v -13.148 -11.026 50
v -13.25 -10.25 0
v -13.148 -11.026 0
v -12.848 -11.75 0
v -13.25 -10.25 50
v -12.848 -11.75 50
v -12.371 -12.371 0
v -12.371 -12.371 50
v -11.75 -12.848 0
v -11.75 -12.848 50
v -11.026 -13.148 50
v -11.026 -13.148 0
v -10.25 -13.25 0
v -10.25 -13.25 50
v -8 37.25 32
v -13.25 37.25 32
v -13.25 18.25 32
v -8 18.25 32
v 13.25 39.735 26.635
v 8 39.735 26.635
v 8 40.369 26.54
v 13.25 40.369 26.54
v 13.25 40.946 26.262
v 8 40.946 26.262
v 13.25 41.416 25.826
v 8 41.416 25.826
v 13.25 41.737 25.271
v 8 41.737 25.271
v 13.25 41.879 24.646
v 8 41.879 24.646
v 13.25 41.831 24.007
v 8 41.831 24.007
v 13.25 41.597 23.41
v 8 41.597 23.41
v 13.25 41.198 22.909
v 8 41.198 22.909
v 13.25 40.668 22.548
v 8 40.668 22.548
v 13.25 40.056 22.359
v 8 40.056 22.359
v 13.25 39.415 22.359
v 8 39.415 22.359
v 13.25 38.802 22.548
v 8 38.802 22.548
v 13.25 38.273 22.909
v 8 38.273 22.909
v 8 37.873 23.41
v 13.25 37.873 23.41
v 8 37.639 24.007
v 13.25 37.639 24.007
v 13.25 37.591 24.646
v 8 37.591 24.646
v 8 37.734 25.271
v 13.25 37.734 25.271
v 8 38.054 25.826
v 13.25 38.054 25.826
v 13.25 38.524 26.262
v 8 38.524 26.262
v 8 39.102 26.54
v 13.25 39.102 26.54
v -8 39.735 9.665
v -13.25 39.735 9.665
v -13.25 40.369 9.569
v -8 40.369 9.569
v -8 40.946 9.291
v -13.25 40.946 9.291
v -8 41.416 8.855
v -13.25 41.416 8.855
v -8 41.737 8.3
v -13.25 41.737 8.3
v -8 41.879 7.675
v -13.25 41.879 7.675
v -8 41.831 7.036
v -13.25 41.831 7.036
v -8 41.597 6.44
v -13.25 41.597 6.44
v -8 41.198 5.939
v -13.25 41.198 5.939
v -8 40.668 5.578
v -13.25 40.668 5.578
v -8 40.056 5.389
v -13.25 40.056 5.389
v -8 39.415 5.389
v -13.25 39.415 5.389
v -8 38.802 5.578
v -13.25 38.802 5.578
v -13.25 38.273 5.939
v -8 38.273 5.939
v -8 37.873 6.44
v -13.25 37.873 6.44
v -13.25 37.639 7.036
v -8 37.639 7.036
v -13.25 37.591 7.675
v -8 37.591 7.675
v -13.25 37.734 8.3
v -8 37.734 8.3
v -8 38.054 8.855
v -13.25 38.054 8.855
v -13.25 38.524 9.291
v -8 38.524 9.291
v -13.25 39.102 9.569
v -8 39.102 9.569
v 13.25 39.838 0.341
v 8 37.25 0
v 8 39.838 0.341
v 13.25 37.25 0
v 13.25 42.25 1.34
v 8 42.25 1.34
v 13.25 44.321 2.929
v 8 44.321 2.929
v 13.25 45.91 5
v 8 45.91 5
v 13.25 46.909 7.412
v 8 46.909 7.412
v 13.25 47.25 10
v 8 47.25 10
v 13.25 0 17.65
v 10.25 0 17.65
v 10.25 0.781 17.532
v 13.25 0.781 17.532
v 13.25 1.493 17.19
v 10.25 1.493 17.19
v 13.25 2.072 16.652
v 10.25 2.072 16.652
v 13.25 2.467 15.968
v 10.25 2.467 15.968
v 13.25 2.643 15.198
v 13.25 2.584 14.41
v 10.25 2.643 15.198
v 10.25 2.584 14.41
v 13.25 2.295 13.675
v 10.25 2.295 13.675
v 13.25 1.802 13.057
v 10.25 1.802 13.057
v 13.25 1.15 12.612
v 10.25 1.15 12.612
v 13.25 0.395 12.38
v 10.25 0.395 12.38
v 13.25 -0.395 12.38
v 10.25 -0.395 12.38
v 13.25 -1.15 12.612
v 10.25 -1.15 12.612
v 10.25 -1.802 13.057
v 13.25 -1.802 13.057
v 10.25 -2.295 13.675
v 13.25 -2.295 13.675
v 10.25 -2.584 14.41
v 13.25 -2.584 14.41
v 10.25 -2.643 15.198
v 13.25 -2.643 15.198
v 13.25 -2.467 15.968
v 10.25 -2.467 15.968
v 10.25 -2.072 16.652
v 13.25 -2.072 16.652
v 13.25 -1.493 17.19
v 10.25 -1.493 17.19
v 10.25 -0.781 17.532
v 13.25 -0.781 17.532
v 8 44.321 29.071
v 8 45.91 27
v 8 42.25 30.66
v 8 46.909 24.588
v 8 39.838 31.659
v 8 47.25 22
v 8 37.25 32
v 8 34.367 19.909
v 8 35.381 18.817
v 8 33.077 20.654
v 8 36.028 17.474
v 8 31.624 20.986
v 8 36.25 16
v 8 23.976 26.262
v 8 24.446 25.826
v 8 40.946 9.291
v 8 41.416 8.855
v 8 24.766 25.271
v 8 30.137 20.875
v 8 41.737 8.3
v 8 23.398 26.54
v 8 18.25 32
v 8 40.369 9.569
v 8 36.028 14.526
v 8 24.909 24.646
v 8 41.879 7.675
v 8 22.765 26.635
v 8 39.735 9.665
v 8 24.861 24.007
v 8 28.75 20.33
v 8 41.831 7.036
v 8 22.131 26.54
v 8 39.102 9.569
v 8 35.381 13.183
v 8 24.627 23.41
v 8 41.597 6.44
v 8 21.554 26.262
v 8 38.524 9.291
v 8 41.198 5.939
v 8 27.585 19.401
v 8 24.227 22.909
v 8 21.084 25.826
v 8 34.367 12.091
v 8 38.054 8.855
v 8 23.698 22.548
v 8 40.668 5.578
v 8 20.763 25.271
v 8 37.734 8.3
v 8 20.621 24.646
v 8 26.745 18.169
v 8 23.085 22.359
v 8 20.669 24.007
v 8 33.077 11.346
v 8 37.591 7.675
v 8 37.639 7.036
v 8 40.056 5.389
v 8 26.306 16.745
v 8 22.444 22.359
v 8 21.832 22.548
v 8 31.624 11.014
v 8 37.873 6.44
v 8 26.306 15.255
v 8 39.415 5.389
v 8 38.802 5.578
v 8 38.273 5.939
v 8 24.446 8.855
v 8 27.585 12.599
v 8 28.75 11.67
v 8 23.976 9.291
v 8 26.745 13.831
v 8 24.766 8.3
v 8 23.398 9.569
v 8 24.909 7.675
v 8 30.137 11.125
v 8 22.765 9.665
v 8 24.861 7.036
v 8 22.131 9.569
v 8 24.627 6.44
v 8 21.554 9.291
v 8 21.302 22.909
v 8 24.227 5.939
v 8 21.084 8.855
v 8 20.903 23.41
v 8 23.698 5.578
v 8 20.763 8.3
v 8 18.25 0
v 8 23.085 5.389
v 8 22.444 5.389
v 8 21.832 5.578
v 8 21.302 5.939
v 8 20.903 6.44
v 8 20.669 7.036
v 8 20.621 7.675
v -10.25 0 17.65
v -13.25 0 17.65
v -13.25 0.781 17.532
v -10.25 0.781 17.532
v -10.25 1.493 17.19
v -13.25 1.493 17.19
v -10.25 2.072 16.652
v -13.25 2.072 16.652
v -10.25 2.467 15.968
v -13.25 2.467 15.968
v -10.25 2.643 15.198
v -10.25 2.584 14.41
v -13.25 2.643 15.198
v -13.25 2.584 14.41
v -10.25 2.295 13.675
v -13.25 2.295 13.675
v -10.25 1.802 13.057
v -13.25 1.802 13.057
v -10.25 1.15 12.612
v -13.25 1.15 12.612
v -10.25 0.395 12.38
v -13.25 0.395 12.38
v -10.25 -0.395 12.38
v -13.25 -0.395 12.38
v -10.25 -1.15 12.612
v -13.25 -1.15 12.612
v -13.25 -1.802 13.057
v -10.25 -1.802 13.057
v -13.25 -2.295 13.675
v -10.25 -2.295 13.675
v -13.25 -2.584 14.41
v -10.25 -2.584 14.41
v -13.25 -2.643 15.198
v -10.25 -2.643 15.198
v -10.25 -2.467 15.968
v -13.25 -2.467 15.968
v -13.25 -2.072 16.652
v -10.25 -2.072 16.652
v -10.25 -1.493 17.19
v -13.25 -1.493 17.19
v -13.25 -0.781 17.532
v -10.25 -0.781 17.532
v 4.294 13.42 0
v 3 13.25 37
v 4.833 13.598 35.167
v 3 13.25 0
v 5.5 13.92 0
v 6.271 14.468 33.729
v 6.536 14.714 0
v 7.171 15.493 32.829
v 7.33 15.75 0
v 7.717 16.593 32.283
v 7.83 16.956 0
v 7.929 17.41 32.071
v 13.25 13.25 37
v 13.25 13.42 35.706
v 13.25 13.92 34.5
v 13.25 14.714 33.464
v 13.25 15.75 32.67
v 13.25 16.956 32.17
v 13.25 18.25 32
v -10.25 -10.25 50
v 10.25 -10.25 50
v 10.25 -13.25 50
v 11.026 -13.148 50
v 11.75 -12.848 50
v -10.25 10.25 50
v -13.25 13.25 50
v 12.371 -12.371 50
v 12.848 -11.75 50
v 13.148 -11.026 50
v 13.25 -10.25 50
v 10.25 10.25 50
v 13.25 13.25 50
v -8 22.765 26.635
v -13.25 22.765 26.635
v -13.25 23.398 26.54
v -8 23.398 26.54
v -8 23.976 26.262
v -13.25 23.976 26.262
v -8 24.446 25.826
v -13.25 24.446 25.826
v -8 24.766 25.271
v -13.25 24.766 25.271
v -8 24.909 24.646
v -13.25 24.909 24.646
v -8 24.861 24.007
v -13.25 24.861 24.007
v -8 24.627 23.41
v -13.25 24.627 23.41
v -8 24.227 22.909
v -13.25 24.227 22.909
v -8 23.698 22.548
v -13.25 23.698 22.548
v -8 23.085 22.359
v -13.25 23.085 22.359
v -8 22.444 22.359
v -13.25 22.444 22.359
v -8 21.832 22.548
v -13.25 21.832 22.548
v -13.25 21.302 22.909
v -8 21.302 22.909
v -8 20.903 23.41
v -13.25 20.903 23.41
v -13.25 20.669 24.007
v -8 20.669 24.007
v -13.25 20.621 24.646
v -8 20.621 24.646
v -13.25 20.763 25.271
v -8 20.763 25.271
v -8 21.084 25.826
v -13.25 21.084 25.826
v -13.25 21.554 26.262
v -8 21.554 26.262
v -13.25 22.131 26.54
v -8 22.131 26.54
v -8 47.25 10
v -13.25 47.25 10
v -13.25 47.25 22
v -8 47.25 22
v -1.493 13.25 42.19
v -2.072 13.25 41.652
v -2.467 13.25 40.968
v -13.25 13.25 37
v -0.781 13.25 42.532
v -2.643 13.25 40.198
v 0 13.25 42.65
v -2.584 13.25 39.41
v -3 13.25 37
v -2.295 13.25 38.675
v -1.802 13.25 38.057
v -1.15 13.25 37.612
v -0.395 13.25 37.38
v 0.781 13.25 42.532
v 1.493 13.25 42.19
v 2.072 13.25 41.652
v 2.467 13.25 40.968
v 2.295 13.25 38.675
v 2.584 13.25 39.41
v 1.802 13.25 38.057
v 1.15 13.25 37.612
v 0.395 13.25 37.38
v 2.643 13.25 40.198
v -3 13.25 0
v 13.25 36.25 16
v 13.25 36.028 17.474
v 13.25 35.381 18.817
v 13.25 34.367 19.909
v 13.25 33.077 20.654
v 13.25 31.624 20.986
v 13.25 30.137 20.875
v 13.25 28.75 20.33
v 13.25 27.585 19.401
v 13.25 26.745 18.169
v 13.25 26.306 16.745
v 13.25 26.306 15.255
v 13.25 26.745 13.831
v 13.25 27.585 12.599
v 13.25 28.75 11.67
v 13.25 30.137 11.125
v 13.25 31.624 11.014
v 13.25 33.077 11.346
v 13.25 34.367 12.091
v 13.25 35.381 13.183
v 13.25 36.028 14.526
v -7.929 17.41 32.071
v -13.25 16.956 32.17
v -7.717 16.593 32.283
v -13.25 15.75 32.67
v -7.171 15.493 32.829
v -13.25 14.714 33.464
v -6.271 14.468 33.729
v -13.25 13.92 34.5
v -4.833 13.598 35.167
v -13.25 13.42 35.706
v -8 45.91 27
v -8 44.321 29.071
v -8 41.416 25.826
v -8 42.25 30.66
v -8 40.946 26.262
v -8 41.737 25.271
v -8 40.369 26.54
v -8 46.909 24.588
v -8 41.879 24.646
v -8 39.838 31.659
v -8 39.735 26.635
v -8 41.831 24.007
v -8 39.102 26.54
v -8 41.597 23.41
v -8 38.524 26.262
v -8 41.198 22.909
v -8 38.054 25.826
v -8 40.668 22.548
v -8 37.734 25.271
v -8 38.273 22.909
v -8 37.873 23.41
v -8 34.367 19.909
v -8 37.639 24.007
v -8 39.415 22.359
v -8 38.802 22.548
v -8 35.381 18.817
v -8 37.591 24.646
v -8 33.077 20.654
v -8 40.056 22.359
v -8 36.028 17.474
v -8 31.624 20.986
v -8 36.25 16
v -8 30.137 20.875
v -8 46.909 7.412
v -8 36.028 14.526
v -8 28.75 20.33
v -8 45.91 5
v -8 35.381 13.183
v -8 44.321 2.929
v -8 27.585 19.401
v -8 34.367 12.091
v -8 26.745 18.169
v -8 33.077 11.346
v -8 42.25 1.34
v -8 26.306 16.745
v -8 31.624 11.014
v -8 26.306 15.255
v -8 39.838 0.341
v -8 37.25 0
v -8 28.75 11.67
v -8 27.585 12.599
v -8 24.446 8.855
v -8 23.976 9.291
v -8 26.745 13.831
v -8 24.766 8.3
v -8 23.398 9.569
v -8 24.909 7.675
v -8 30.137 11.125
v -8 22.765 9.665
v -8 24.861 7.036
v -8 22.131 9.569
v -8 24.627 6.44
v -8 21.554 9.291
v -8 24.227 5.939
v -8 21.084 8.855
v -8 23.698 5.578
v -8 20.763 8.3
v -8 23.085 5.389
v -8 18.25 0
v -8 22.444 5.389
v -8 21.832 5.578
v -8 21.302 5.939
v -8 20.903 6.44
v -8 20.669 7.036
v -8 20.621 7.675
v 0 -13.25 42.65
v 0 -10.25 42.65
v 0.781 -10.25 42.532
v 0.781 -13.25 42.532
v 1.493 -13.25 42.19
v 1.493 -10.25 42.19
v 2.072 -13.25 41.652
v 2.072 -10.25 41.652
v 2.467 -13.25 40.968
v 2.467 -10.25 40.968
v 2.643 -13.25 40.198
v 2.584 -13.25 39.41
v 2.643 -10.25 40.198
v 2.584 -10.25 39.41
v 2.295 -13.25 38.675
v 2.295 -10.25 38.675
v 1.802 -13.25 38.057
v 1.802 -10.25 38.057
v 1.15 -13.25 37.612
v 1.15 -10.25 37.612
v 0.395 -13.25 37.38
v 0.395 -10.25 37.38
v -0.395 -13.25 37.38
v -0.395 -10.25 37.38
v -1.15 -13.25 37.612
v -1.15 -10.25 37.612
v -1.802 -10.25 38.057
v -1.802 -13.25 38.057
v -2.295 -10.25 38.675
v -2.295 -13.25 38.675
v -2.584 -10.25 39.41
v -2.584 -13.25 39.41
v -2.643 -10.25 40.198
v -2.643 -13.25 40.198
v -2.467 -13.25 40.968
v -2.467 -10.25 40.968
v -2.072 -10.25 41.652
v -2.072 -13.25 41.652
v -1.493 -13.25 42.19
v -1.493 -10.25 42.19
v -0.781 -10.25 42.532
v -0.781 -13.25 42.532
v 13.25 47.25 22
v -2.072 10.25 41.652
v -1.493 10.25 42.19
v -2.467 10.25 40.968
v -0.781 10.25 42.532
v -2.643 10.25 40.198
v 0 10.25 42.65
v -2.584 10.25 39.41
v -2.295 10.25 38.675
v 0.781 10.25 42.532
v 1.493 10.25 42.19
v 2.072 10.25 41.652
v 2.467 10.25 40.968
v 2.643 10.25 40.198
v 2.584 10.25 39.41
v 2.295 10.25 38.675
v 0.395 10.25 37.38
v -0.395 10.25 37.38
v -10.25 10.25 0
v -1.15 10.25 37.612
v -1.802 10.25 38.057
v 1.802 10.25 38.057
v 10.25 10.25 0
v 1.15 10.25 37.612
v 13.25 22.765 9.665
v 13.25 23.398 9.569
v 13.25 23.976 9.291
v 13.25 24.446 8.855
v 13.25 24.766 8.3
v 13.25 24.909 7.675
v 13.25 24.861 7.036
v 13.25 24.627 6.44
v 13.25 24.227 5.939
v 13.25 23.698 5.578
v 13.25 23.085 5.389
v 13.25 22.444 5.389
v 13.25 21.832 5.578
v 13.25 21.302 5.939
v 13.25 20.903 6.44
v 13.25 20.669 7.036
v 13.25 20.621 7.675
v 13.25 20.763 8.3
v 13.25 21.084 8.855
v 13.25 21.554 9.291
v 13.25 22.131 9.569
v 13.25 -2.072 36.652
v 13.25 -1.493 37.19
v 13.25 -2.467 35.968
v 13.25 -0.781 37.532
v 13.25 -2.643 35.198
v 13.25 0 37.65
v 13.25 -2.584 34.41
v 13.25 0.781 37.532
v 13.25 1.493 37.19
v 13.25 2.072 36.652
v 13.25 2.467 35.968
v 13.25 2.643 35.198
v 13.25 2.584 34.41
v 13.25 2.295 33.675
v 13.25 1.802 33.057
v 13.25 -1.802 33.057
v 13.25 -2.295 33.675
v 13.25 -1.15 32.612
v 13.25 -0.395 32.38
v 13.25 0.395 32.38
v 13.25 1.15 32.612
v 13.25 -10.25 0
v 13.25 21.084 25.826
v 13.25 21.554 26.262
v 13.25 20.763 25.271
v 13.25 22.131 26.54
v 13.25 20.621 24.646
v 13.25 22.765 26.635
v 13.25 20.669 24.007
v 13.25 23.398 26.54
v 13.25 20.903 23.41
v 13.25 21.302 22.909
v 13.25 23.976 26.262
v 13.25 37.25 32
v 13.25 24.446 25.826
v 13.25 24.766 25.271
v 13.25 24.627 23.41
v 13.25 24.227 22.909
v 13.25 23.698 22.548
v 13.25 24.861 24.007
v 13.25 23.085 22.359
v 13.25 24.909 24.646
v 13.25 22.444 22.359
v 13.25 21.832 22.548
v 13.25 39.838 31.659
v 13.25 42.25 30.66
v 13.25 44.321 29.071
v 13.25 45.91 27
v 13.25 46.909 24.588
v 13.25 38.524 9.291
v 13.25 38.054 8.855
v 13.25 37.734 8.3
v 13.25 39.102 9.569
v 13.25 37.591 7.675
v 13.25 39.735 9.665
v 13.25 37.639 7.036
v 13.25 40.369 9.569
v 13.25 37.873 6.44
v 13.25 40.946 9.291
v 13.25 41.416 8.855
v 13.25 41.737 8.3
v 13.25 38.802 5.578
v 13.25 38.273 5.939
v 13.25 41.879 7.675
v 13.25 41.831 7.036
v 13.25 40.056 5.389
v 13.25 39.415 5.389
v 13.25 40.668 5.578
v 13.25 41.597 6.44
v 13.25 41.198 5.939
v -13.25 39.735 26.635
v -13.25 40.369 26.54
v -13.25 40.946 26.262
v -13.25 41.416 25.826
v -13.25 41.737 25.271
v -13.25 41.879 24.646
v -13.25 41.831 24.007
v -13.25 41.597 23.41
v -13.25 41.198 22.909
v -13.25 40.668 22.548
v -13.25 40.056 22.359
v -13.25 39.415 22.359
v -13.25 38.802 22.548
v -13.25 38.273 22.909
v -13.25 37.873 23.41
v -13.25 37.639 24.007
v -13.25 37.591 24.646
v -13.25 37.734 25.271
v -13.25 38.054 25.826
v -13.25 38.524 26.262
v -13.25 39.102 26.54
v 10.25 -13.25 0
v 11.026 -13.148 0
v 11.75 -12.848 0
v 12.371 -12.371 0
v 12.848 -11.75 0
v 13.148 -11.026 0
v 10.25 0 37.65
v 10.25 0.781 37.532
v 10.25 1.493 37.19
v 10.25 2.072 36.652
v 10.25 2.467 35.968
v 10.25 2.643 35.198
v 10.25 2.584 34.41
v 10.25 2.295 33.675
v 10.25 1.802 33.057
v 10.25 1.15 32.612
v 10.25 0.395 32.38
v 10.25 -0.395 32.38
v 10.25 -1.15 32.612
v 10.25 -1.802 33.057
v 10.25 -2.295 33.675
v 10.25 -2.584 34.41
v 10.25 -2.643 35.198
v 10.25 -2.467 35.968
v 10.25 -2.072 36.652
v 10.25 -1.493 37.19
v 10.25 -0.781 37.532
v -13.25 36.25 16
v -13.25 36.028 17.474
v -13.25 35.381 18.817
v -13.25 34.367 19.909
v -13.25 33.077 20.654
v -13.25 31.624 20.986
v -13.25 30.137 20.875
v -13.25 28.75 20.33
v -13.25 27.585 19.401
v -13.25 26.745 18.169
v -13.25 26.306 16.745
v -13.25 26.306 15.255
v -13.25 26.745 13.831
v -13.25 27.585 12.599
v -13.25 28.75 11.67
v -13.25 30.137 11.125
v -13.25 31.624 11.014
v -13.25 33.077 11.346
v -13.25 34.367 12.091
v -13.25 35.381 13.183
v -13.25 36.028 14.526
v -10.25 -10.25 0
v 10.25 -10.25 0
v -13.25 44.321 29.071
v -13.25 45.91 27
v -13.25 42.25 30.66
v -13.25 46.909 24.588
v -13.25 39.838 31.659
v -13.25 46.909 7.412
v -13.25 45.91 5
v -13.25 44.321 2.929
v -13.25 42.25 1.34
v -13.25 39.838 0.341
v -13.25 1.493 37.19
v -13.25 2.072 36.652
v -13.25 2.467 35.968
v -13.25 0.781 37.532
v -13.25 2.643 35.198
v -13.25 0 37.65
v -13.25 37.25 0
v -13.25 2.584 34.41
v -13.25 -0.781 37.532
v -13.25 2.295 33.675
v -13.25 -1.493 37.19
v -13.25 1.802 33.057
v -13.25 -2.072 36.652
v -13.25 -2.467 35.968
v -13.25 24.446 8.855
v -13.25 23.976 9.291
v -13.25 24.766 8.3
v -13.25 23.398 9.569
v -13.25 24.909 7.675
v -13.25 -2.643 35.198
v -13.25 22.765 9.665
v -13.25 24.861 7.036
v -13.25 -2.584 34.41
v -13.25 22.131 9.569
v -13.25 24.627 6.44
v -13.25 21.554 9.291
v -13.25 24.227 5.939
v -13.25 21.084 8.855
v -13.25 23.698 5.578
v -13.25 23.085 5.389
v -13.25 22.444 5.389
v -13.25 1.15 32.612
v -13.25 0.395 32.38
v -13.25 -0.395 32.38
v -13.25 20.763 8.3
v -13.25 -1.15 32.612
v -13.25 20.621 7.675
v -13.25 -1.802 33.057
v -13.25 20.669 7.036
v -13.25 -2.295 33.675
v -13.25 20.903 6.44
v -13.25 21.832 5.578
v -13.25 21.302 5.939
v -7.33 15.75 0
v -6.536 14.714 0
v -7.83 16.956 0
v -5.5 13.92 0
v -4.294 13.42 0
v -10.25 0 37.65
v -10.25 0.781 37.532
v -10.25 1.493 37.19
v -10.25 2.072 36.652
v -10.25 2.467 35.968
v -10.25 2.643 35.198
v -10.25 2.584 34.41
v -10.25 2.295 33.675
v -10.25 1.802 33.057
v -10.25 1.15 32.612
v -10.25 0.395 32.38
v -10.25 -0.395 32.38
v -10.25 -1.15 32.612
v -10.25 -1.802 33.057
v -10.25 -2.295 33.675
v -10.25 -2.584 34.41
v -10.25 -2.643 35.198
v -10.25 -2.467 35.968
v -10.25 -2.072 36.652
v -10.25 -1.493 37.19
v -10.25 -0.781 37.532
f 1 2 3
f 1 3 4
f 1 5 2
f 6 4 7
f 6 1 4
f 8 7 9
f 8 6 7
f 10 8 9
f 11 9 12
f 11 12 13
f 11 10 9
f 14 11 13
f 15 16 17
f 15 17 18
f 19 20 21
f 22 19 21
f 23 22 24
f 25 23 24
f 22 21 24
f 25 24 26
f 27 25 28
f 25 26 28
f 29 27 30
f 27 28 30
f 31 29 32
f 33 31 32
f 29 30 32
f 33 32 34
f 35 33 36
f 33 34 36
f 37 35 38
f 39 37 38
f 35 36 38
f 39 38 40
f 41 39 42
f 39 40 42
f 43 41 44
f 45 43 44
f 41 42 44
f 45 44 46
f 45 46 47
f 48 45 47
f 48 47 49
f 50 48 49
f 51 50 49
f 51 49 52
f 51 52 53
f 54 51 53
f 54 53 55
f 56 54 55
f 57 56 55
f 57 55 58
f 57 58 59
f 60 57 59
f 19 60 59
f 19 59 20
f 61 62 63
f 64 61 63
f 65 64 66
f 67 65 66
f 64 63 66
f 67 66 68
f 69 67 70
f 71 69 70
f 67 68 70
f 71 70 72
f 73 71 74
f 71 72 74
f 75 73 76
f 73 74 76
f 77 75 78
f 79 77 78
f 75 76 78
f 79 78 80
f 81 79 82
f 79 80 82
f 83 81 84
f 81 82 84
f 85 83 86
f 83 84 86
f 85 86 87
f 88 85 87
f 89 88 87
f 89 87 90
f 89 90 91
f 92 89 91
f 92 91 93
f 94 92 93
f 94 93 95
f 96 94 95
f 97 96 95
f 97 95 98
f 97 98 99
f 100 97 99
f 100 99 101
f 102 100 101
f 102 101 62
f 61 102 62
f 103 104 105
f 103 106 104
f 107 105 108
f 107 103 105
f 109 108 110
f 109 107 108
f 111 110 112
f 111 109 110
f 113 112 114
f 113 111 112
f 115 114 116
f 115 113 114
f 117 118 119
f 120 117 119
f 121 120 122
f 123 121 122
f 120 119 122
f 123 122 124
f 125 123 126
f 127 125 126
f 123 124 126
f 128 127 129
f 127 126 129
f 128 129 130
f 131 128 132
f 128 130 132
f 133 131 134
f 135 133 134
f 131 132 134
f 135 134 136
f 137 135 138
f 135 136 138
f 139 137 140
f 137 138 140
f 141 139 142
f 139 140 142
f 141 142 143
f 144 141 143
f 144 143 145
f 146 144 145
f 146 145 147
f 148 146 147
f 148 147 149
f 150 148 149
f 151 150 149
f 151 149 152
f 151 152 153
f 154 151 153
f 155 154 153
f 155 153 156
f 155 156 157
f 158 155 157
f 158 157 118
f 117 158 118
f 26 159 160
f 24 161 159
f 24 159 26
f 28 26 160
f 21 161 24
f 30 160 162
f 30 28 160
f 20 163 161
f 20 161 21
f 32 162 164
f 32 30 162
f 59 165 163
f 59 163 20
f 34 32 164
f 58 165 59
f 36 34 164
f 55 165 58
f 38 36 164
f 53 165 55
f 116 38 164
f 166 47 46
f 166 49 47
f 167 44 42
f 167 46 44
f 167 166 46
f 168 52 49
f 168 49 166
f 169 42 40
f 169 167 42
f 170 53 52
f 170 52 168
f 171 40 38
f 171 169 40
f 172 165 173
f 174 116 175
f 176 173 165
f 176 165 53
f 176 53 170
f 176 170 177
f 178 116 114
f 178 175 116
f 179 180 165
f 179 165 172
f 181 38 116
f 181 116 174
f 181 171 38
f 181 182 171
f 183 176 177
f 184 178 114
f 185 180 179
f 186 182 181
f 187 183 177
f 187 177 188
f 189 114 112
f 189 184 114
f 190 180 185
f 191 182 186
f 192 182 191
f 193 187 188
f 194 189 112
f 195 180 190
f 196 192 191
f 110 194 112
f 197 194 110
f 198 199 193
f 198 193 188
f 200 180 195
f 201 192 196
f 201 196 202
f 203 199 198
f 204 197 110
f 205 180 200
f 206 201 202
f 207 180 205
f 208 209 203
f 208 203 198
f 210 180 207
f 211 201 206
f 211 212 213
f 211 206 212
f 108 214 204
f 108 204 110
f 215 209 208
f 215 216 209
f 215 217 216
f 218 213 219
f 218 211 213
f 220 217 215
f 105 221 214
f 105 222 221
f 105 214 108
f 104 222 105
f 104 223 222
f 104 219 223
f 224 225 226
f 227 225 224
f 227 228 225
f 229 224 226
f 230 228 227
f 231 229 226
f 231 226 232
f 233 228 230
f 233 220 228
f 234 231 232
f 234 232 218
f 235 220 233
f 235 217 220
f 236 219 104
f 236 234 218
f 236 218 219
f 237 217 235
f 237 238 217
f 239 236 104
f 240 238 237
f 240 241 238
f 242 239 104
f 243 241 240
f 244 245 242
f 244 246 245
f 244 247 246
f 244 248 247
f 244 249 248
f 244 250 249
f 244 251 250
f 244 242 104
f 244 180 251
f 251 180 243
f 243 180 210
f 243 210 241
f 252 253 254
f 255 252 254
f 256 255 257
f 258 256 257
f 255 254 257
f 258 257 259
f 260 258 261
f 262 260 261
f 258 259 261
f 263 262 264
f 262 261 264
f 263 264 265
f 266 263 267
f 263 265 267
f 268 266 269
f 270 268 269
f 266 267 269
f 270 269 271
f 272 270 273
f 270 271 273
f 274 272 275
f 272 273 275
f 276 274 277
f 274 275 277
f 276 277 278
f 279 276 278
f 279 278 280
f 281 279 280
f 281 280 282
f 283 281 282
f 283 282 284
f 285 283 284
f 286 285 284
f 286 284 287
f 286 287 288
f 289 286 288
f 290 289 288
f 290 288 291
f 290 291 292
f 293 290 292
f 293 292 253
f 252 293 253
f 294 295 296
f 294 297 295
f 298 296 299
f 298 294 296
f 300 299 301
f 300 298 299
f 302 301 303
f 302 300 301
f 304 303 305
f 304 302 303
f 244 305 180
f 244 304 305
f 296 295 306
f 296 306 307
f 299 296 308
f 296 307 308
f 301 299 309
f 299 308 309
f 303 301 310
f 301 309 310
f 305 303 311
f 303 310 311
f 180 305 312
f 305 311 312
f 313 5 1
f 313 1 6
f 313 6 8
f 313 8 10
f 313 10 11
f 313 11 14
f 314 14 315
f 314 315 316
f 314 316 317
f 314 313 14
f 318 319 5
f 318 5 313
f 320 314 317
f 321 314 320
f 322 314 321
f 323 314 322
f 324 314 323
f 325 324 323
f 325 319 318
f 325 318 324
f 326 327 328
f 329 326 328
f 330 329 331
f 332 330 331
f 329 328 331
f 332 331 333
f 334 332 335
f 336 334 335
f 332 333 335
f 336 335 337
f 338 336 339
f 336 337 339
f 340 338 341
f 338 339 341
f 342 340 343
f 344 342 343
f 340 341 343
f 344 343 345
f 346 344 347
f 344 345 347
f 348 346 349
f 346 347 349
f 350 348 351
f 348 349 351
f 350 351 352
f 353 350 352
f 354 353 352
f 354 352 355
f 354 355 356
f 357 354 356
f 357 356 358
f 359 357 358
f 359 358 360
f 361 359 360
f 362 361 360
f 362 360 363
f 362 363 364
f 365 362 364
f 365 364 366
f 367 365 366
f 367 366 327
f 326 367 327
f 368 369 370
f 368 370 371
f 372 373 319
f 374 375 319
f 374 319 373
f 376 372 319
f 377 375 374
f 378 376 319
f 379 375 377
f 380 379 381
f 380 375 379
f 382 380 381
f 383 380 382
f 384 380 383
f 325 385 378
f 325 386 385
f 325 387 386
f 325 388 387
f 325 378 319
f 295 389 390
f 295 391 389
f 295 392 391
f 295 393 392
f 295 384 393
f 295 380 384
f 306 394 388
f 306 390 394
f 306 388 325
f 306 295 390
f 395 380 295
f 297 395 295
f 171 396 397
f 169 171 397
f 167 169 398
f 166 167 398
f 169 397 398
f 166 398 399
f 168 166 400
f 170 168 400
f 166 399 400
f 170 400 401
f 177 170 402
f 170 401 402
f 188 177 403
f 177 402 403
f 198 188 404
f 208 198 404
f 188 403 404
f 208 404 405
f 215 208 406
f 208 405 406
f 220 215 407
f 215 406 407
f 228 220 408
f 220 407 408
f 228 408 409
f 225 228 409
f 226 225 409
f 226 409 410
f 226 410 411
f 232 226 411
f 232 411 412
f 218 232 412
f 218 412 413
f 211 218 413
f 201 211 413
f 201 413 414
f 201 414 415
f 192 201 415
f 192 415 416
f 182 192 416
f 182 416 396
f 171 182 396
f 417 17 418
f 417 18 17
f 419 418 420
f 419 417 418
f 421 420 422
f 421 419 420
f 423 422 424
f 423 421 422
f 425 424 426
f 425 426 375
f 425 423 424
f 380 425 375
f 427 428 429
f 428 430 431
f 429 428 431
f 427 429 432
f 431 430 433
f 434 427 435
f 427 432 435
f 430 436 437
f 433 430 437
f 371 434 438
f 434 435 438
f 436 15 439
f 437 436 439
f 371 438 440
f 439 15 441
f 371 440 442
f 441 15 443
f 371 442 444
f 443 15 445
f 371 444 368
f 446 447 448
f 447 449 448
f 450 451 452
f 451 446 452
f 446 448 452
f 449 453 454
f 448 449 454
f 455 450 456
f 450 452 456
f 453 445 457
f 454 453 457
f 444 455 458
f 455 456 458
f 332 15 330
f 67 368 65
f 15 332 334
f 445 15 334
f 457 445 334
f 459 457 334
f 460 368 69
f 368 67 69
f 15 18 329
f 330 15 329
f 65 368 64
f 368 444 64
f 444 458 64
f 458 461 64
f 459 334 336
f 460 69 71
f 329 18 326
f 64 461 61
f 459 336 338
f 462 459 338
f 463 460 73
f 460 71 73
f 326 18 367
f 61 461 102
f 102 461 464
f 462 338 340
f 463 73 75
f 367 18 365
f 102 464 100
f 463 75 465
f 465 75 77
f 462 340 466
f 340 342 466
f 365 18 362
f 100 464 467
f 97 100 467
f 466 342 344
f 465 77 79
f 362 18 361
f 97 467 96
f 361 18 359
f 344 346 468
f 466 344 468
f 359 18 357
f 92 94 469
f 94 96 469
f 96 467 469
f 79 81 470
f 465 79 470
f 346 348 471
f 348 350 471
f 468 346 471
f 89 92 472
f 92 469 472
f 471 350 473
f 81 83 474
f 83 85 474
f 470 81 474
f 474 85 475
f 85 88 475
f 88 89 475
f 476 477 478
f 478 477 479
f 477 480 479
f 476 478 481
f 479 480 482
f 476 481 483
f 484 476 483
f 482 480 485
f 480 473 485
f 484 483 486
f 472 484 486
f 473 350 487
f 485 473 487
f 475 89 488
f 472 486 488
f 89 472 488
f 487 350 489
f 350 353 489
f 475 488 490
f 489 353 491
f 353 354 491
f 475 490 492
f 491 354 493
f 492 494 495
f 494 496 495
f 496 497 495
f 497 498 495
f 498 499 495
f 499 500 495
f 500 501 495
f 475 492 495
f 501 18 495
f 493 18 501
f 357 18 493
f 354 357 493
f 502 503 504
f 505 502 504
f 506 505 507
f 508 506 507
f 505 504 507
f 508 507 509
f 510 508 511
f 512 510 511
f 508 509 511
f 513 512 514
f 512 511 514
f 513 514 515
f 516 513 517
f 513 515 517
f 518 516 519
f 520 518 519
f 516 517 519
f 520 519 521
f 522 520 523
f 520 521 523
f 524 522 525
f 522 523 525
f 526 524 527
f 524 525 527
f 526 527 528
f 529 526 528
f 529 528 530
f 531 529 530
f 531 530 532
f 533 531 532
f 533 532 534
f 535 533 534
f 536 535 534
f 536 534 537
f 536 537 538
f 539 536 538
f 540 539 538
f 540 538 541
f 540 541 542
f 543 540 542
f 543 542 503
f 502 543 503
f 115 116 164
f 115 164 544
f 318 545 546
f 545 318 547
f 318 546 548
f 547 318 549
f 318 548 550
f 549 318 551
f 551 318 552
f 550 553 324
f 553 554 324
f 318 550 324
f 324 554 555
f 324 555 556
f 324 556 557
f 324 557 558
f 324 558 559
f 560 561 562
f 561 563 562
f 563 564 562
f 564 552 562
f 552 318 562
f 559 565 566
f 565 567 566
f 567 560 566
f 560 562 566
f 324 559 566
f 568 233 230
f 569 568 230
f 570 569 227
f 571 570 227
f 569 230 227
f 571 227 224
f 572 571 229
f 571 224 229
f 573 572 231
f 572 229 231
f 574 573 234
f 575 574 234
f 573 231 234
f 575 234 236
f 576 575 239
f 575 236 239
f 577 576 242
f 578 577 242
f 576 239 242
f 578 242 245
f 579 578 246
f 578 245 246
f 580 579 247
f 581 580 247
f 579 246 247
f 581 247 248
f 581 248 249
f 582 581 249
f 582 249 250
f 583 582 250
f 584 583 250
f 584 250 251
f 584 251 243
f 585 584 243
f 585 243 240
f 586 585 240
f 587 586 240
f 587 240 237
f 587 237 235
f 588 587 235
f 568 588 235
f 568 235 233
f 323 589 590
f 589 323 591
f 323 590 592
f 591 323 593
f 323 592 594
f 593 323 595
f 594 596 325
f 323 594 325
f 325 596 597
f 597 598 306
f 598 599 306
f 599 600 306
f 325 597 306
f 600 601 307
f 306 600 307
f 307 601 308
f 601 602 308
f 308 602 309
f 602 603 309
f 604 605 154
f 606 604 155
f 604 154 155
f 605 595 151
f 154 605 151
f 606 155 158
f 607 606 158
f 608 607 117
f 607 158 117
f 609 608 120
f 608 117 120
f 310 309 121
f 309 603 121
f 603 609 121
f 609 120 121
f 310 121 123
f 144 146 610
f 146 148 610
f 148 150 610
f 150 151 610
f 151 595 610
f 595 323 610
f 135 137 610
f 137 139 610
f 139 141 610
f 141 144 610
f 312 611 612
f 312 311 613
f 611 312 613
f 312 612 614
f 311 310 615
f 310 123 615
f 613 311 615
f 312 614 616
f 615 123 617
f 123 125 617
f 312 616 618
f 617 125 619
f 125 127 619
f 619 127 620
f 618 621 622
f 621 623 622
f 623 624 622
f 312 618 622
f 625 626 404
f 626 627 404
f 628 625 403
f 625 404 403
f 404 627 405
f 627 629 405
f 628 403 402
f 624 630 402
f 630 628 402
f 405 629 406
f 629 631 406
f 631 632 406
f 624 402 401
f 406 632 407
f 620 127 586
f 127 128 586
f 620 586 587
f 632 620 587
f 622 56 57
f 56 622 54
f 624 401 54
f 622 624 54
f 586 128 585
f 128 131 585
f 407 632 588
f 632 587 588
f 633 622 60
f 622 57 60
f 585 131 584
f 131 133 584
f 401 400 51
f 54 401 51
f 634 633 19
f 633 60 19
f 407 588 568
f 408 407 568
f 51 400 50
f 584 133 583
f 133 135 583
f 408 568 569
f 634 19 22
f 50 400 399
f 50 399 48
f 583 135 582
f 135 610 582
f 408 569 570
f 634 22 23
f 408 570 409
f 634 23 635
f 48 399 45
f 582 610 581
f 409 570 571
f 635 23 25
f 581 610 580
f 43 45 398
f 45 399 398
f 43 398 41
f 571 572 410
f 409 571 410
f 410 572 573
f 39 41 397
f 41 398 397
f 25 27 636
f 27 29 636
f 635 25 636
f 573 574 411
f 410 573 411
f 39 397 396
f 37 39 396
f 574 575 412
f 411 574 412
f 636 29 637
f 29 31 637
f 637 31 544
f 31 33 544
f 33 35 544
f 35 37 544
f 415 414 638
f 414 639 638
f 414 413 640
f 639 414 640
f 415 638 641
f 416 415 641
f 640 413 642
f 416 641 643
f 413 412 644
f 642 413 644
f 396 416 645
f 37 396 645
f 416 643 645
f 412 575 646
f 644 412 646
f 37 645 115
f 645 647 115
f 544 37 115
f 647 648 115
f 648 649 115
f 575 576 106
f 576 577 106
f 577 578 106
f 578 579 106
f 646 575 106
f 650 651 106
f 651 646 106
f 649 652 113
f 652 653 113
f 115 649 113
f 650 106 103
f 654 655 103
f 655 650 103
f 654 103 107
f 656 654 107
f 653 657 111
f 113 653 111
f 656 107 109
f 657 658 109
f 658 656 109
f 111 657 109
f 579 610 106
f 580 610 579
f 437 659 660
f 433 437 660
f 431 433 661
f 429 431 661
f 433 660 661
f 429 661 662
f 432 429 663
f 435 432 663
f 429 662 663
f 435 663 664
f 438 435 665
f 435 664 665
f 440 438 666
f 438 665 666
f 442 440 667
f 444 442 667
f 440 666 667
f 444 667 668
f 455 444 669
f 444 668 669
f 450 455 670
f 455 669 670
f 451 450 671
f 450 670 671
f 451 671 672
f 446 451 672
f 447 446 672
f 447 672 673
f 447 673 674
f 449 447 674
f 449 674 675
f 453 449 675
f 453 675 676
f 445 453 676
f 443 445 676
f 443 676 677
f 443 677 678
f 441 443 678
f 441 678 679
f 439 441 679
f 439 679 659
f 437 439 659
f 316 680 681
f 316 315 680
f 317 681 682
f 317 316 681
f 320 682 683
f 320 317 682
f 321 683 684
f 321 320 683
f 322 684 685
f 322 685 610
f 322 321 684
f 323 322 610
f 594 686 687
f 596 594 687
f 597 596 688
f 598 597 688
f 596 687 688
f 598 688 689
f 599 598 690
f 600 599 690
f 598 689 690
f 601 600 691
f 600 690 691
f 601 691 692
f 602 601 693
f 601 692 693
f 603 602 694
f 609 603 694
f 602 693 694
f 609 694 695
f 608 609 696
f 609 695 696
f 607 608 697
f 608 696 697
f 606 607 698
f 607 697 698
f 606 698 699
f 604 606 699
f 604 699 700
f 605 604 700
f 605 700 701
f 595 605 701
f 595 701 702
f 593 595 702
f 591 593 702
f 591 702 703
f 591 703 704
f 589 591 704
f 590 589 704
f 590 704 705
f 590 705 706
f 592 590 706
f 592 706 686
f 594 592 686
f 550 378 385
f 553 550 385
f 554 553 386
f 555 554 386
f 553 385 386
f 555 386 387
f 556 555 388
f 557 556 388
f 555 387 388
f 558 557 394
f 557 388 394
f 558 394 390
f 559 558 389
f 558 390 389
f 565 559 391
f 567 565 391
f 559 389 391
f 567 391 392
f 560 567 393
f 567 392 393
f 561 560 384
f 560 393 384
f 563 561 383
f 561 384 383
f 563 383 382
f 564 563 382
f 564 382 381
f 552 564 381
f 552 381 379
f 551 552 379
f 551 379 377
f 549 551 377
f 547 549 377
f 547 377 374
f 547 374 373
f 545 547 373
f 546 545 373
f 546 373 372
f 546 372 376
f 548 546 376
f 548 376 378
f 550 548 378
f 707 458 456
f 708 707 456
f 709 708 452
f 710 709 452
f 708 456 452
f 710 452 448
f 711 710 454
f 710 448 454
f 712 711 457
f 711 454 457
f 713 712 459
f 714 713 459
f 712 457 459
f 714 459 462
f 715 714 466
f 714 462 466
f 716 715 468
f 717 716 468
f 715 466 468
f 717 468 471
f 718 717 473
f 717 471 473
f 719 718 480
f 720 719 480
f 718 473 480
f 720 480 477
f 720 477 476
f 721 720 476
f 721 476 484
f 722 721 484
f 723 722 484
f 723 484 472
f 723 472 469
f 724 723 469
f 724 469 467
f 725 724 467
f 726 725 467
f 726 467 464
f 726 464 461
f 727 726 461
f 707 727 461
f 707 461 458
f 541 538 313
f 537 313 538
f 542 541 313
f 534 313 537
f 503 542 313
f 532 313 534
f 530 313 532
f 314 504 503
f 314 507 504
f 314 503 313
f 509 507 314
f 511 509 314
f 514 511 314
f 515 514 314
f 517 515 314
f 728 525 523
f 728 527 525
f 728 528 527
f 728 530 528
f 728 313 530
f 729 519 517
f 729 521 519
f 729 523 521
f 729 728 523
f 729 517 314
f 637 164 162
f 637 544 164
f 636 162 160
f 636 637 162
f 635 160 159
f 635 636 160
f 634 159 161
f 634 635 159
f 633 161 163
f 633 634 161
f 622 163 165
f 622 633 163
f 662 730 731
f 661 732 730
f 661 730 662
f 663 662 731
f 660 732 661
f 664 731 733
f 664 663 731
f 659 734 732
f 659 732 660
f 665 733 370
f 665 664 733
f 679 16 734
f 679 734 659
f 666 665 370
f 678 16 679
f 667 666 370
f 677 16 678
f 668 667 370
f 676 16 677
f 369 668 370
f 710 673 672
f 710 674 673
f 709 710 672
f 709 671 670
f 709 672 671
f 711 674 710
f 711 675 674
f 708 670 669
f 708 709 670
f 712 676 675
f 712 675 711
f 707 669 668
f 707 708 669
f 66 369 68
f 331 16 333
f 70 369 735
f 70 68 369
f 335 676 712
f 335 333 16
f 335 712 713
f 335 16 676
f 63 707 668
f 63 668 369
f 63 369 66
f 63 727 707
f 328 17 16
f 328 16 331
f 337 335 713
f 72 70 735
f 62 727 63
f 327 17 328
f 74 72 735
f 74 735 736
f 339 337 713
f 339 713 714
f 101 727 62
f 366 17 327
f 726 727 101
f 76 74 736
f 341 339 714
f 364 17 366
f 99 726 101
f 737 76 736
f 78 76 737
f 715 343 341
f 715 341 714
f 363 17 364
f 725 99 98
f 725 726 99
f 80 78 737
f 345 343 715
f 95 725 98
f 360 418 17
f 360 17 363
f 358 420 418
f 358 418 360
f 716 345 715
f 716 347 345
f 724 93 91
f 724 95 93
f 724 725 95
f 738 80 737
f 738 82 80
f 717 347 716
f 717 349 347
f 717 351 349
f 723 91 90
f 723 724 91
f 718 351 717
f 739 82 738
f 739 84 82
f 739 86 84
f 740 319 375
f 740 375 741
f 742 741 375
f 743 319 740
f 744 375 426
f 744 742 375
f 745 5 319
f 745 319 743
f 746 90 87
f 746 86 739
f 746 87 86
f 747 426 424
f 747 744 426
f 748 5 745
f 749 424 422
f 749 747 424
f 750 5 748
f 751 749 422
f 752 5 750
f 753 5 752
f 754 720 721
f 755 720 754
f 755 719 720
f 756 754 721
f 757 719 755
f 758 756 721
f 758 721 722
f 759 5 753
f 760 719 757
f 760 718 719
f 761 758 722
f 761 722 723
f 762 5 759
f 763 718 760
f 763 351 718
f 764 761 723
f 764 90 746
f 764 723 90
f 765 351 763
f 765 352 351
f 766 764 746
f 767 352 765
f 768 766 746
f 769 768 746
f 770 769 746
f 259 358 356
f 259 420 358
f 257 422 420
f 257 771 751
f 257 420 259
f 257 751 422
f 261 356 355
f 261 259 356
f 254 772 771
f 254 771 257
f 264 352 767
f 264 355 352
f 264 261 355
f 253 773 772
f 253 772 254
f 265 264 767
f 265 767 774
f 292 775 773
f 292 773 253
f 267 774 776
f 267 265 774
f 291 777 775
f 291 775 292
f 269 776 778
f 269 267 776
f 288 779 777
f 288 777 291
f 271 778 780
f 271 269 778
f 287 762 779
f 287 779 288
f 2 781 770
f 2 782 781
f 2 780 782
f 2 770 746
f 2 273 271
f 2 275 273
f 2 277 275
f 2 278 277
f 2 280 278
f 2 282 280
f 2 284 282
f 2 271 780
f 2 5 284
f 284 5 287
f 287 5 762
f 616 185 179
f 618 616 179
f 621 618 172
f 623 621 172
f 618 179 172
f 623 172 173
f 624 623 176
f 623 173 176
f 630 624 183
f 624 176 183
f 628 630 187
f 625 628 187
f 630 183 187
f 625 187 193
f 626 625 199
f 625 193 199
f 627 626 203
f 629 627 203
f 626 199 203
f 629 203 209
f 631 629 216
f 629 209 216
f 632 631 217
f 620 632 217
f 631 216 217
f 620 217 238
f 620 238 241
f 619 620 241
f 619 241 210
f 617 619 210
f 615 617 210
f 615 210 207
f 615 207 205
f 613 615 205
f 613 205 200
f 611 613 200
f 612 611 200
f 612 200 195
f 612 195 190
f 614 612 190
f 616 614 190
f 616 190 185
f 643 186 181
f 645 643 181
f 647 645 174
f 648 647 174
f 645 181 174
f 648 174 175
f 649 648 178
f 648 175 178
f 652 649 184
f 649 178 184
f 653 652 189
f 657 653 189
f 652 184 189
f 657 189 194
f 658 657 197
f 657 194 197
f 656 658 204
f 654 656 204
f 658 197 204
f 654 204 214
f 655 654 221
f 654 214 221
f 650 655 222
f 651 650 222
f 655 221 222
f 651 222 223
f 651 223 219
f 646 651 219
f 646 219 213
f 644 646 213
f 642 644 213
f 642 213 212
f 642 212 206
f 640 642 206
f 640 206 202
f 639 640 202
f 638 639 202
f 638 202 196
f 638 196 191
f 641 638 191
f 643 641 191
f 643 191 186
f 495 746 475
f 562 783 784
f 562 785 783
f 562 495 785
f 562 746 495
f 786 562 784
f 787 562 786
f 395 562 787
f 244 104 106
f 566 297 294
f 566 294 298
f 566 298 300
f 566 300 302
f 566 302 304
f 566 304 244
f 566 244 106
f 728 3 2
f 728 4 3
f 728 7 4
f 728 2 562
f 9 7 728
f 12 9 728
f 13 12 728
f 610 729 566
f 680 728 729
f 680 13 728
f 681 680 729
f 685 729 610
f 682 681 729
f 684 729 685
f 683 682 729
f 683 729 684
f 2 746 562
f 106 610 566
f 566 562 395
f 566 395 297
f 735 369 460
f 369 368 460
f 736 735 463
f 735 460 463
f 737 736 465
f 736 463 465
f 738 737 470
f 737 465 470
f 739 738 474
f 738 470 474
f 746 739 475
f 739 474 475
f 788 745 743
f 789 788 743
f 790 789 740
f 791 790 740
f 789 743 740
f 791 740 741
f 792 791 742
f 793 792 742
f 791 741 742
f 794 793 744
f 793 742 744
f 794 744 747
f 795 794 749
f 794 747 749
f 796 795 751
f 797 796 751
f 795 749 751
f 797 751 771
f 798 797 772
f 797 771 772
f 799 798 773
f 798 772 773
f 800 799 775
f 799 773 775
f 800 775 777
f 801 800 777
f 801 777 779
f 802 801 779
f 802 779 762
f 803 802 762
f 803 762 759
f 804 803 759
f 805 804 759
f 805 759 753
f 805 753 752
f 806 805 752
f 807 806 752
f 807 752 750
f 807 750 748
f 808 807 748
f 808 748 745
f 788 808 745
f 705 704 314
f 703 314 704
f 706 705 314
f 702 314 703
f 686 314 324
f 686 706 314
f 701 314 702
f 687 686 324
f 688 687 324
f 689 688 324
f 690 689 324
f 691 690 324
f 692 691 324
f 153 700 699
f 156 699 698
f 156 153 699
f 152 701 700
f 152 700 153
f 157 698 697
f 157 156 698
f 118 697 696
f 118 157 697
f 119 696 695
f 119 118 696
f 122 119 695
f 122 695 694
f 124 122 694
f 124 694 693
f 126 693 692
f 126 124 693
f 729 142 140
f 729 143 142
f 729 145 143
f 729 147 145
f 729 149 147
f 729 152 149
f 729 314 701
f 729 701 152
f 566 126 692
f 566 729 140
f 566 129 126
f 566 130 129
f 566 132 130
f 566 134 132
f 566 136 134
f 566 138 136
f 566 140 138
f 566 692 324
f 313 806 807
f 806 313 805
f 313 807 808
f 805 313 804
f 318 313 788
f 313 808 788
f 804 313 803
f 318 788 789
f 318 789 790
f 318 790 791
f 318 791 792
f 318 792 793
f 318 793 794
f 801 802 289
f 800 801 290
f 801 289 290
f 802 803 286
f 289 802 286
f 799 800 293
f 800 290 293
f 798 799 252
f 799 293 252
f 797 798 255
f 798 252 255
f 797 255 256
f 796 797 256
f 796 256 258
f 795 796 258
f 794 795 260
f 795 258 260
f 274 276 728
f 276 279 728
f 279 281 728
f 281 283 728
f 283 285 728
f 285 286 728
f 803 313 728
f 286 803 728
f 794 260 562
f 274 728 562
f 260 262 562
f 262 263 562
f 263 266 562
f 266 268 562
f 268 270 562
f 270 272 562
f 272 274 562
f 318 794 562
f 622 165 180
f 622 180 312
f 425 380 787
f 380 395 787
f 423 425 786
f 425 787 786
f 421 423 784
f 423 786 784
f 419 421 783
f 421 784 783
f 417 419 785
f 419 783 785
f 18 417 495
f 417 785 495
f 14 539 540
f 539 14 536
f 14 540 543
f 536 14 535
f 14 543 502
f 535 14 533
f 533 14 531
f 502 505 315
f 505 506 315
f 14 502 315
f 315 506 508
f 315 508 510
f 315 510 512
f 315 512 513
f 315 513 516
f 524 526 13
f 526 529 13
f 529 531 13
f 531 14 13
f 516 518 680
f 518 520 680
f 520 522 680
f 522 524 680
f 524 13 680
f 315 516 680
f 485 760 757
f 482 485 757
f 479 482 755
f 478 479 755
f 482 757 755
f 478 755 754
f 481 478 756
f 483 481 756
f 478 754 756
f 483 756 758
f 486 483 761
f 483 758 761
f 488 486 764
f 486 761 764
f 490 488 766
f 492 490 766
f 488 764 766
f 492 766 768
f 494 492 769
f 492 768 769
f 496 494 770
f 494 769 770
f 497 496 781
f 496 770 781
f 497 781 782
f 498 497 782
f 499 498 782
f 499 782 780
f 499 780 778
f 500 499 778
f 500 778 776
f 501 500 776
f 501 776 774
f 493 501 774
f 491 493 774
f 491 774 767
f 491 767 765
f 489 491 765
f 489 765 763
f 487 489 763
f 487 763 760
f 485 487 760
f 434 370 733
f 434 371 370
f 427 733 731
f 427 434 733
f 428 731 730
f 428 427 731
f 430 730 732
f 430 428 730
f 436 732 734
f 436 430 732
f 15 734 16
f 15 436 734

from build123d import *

# Parameters (mm, degrees)
SKETCH_1_W          = 26.5
SKETCH_1_H          = 26.5
SKETCH_1_W_2        = 20.5
SKETCH_1_H_2        = 20.5
EXTRUDE_1_DEPTH     = 50
SKETCH_2_W          = 5.25
SKETCH_2_H          = 32
EXTRUDE_6_DEPTH     = 34
SKETCH_6_R          = 4.5
SKETCH_6_R_2        = 2.15
CUT_EXTRUDE_4_DEPTH = 74.72118081
FILLET_4_R          = 5
FILLET_7_R          = 10
FILLET_8_R          = 10
FILLET_9_R          = 3
SKETCH_7_R          = 2.65
CUT_EXTRUDE_5_DEPTH = 62.899616315
SKETCH_8_R          = 2.65
CUT_EXTRUDE_6_DEPTH = 74.72118081
SKETCH_9_R          = 5
CUT_EXTRUDE_7_DEPTH = 74.72118081


with BuildPart() as part:
    # 草图1 → 凸台-拉伸1 (new body)
    with BuildSketch(Plane.XY):
        Rectangle(SKETCH_1_W, SKETCH_1_H)
        Rectangle(SKETCH_1_W_2, SKETCH_1_H_2, mode=Mode.SUBTRACT)
    extrude(amount=EXTRUDE_1_DEPTH)

    # 草图2 → 凸台-拉伸6 (add)
    with BuildSketch(Plane(origin=(0, 13.25, 0), x_dir=(1, 0, 0), z_dir=(0, 1, 0))):
        with Locations((-10.625, -16)):
            Rectangle(SKETCH_2_W, SKETCH_2_H)
        with Locations((10.625, -16)):
            Rectangle(SKETCH_2_W, SKETCH_2_H)
    extrude(amount=EXTRUDE_6_DEPTH)

    # 草图6 → 切除-拉伸4 (cut, through all)
    with BuildSketch(Plane.ZY.offset(13.25)):
        with Locations((16, 31.25)):
            Circle(SKETCH_6_R)
        with Locations((7.514718626, 39.735281374)):
            Circle(SKETCH_6_R_2)
        with Locations((24.485281374, 39.735281374)):
            Circle(SKETCH_6_R_2)
        with Locations((24.485281374, 22.764718626)):
            Circle(SKETCH_6_R_2)
        with Locations((7.514718626, 22.764718626)):
            Circle(SKETCH_6_R_2)
    extrude(amount=-CUT_EXTRUDE_4_DEPTH, mode=Mode.SUBTRACT)

    # 圆角4
    fillet_4_edges = [part.edges().sort_by_distance(p)[0] for p in [
        (-8, 13.25, 16),
        (-10.625, 13.25, 32),
        (10.625, 13.25, 32),
        (8, 13.25, 16),
    ]]
    fillet(fillet_4_edges, radius=FILLET_4_R)

    # 圆角7
    fillet_7_edges = [part.edges().sort_by_distance(p)[0] for p in [
        (-10.625, 47.25, 0),
        (10.625, 47.25, 0),
    ]]
    fillet(fillet_7_edges, radius=FILLET_7_R)

    # 圆角8
    fillet_8_edges = [part.edges().sort_by_distance(p)[0] for p in [
        (-10.625, 47.25, 32),
        (10.625, 47.25, 32),
    ]]
    fillet(fillet_8_edges, radius=FILLET_8_R)

    # 圆角9
    fillet_9_edges = [part.edges().sort_by_distance(p)[0] for p in [
        (13.25, -13.25, 25),
        (-13.25, -13.25, 25),
    ]]
    fillet(fillet_9_edges, radius=FILLET_9_R)

    # 草图7 → 切除-拉伸5 (cut, through all)
    with BuildSketch(Plane(origin=(0, 13.25, 0), x_dir=(1, 0, 0), z_dir=(0, 1, 0))):
        with Locations(Location((0, -40, 0), (0, 0, 270))):
            Circle(SKETCH_7_R)
    extrude(amount=-CUT_EXTRUDE_5_DEPTH, mode=Mode.SUBTRACT)

    # 草图8 → 切除-拉伸6 (cut, through all)
    with BuildSketch(Plane.ZY.offset(13.25)):
        with Locations((35, 0)):
            Circle(SKETCH_8_R)
        with Locations((15, 0)):
            Circle(SKETCH_8_R)
    extrude(amount=-CUT_EXTRUDE_6_DEPTH, mode=Mode.SUBTRACT)

    # 草图9 → 切除-拉伸7 (cut, through all)
    with BuildSketch(Plane(origin=(13.25, 0, 0), x_dir=(0, 0, -1), z_dir=(1, 0, 0))):
        with Locations(Location((-16, 31.25, 0), (0, 0, 90))):
            Circle(SKETCH_9_R)
    extrude(amount=-CUT_EXTRUDE_7_DEPTH, mode=Mode.SUBTRACT)


solid = part.part
